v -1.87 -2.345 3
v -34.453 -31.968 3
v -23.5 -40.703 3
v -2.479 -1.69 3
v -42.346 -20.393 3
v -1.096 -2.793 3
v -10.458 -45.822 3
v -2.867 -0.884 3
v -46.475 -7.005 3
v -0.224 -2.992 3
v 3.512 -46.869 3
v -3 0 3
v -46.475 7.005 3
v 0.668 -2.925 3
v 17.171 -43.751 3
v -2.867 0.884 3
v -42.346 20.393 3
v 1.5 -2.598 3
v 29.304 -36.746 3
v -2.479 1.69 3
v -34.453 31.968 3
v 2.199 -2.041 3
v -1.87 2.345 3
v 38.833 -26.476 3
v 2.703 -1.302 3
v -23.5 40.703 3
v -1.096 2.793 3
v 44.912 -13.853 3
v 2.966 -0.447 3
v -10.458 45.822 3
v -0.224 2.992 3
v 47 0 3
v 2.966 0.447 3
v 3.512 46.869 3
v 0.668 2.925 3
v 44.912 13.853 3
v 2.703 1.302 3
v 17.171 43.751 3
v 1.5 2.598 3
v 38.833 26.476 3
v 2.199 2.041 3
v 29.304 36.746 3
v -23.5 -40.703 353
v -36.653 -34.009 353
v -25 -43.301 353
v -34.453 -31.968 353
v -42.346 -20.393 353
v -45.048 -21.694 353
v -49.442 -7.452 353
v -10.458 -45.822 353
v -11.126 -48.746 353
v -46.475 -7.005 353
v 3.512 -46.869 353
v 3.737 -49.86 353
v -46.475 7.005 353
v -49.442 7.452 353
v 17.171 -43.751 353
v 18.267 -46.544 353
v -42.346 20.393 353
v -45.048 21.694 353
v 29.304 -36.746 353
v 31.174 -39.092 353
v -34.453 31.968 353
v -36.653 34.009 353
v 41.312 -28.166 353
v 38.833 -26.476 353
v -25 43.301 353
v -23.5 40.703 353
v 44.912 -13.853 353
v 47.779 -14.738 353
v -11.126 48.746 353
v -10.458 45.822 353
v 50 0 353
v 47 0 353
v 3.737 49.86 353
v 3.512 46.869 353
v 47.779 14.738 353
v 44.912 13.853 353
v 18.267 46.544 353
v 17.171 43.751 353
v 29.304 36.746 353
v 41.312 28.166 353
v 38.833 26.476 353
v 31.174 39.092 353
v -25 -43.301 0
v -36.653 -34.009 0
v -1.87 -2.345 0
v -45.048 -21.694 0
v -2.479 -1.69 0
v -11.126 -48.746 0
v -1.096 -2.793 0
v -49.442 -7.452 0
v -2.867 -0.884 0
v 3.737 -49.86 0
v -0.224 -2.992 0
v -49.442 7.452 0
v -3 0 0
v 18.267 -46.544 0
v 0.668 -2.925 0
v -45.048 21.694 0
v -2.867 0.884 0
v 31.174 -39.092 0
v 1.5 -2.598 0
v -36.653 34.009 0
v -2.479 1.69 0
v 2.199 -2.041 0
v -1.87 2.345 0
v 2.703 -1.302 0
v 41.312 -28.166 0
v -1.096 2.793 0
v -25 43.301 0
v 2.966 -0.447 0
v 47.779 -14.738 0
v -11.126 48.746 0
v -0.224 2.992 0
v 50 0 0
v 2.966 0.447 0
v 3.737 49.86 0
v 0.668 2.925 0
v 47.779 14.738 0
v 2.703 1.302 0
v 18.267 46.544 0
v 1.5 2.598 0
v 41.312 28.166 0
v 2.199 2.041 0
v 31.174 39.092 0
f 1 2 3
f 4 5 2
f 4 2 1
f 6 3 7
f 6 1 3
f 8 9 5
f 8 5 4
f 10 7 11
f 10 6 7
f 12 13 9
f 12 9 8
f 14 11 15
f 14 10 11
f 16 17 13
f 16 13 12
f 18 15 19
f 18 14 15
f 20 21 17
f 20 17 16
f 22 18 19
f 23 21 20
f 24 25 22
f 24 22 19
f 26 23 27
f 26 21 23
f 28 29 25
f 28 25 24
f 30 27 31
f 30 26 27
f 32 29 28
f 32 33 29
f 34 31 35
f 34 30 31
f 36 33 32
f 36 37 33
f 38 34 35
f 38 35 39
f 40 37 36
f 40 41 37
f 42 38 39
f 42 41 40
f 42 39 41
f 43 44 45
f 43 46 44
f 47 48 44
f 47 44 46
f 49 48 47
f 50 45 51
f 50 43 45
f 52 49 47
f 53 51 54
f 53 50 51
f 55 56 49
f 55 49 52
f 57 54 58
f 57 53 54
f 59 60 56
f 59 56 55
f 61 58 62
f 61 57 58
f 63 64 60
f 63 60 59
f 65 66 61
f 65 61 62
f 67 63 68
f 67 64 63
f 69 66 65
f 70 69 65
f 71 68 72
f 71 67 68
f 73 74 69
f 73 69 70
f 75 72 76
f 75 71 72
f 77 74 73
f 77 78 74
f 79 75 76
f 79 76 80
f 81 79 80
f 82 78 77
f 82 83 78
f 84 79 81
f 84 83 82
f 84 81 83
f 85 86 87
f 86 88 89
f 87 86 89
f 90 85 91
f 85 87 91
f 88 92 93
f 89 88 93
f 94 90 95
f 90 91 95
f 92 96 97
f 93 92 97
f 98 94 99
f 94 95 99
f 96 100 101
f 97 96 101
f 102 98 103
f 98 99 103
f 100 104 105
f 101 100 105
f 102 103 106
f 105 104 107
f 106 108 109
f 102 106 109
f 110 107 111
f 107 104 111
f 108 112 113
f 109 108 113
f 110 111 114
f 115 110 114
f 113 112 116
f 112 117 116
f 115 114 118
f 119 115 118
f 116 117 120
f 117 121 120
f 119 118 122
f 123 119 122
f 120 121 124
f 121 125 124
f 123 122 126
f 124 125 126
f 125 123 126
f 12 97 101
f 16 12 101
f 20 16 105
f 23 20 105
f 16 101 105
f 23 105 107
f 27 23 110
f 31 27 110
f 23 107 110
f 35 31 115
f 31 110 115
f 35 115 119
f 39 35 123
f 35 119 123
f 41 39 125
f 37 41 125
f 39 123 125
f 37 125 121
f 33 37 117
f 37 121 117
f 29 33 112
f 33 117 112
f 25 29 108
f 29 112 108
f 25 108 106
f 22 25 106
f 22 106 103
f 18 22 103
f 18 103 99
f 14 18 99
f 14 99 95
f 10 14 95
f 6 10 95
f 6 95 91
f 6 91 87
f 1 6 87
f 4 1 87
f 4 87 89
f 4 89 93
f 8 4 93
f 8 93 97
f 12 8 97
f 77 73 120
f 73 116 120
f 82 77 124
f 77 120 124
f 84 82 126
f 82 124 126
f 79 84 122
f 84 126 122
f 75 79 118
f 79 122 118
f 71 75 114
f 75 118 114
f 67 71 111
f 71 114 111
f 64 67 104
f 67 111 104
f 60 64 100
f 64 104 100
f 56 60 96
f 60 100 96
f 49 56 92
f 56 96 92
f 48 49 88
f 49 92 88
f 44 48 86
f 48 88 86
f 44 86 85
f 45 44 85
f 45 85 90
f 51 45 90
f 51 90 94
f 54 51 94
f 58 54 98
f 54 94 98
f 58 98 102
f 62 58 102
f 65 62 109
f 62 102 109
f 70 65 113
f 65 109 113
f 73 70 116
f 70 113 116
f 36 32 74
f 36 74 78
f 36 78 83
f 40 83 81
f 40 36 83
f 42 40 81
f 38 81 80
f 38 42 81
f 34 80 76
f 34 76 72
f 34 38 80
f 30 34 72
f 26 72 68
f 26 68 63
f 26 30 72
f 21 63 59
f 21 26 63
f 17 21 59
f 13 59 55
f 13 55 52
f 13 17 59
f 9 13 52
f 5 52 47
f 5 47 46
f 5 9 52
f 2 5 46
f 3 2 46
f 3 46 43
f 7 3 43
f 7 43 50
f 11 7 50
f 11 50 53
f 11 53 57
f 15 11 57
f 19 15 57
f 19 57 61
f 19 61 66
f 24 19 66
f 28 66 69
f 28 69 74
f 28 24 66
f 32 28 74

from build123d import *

# Parameters (mm, degrees)
SKETCH_1_R          = 50
EXTRUDE_1_DEPTH     = 3
SKETCH_2_R          = 50
SKETCH_2_R_2        = 47
EXTRUDE_2_DEPTH     = 350
SKETCH_3_R          = 3
CUT_EXTRUDE_1_DEPTH = 350


with BuildPart() as part:
    # Эскиз1 → Бобышка-Вытянуть1 (new body)
    with BuildSketch(Plane.XY):
        Circle(SKETCH_1_R)
    extrude(amount=EXTRUDE_1_DEPTH)

    # Эскиз2 → Бобышка-Вытянуть2 (add)
    with BuildSketch(Plane.XY.offset(3)):
        Circle(SKETCH_2_R)
        Circle(SKETCH_2_R_2, mode=Mode.SUBTRACT)
    extrude(amount=EXTRUDE_2_DEPTH)

    # Эскиз3 → Вырез-Вытянуть1 (cut)
    with BuildSketch(Plane(origin=(0, 0, 0), x_dir=(-1, 0, 0), z_dir=(0, 0, -1))):
        Circle(SKETCH_3_R)
    extrude(amount=-CUT_EXTRUDE_1_DEPTH, mode=Mode.SUBTRACT)


solid = part.part
